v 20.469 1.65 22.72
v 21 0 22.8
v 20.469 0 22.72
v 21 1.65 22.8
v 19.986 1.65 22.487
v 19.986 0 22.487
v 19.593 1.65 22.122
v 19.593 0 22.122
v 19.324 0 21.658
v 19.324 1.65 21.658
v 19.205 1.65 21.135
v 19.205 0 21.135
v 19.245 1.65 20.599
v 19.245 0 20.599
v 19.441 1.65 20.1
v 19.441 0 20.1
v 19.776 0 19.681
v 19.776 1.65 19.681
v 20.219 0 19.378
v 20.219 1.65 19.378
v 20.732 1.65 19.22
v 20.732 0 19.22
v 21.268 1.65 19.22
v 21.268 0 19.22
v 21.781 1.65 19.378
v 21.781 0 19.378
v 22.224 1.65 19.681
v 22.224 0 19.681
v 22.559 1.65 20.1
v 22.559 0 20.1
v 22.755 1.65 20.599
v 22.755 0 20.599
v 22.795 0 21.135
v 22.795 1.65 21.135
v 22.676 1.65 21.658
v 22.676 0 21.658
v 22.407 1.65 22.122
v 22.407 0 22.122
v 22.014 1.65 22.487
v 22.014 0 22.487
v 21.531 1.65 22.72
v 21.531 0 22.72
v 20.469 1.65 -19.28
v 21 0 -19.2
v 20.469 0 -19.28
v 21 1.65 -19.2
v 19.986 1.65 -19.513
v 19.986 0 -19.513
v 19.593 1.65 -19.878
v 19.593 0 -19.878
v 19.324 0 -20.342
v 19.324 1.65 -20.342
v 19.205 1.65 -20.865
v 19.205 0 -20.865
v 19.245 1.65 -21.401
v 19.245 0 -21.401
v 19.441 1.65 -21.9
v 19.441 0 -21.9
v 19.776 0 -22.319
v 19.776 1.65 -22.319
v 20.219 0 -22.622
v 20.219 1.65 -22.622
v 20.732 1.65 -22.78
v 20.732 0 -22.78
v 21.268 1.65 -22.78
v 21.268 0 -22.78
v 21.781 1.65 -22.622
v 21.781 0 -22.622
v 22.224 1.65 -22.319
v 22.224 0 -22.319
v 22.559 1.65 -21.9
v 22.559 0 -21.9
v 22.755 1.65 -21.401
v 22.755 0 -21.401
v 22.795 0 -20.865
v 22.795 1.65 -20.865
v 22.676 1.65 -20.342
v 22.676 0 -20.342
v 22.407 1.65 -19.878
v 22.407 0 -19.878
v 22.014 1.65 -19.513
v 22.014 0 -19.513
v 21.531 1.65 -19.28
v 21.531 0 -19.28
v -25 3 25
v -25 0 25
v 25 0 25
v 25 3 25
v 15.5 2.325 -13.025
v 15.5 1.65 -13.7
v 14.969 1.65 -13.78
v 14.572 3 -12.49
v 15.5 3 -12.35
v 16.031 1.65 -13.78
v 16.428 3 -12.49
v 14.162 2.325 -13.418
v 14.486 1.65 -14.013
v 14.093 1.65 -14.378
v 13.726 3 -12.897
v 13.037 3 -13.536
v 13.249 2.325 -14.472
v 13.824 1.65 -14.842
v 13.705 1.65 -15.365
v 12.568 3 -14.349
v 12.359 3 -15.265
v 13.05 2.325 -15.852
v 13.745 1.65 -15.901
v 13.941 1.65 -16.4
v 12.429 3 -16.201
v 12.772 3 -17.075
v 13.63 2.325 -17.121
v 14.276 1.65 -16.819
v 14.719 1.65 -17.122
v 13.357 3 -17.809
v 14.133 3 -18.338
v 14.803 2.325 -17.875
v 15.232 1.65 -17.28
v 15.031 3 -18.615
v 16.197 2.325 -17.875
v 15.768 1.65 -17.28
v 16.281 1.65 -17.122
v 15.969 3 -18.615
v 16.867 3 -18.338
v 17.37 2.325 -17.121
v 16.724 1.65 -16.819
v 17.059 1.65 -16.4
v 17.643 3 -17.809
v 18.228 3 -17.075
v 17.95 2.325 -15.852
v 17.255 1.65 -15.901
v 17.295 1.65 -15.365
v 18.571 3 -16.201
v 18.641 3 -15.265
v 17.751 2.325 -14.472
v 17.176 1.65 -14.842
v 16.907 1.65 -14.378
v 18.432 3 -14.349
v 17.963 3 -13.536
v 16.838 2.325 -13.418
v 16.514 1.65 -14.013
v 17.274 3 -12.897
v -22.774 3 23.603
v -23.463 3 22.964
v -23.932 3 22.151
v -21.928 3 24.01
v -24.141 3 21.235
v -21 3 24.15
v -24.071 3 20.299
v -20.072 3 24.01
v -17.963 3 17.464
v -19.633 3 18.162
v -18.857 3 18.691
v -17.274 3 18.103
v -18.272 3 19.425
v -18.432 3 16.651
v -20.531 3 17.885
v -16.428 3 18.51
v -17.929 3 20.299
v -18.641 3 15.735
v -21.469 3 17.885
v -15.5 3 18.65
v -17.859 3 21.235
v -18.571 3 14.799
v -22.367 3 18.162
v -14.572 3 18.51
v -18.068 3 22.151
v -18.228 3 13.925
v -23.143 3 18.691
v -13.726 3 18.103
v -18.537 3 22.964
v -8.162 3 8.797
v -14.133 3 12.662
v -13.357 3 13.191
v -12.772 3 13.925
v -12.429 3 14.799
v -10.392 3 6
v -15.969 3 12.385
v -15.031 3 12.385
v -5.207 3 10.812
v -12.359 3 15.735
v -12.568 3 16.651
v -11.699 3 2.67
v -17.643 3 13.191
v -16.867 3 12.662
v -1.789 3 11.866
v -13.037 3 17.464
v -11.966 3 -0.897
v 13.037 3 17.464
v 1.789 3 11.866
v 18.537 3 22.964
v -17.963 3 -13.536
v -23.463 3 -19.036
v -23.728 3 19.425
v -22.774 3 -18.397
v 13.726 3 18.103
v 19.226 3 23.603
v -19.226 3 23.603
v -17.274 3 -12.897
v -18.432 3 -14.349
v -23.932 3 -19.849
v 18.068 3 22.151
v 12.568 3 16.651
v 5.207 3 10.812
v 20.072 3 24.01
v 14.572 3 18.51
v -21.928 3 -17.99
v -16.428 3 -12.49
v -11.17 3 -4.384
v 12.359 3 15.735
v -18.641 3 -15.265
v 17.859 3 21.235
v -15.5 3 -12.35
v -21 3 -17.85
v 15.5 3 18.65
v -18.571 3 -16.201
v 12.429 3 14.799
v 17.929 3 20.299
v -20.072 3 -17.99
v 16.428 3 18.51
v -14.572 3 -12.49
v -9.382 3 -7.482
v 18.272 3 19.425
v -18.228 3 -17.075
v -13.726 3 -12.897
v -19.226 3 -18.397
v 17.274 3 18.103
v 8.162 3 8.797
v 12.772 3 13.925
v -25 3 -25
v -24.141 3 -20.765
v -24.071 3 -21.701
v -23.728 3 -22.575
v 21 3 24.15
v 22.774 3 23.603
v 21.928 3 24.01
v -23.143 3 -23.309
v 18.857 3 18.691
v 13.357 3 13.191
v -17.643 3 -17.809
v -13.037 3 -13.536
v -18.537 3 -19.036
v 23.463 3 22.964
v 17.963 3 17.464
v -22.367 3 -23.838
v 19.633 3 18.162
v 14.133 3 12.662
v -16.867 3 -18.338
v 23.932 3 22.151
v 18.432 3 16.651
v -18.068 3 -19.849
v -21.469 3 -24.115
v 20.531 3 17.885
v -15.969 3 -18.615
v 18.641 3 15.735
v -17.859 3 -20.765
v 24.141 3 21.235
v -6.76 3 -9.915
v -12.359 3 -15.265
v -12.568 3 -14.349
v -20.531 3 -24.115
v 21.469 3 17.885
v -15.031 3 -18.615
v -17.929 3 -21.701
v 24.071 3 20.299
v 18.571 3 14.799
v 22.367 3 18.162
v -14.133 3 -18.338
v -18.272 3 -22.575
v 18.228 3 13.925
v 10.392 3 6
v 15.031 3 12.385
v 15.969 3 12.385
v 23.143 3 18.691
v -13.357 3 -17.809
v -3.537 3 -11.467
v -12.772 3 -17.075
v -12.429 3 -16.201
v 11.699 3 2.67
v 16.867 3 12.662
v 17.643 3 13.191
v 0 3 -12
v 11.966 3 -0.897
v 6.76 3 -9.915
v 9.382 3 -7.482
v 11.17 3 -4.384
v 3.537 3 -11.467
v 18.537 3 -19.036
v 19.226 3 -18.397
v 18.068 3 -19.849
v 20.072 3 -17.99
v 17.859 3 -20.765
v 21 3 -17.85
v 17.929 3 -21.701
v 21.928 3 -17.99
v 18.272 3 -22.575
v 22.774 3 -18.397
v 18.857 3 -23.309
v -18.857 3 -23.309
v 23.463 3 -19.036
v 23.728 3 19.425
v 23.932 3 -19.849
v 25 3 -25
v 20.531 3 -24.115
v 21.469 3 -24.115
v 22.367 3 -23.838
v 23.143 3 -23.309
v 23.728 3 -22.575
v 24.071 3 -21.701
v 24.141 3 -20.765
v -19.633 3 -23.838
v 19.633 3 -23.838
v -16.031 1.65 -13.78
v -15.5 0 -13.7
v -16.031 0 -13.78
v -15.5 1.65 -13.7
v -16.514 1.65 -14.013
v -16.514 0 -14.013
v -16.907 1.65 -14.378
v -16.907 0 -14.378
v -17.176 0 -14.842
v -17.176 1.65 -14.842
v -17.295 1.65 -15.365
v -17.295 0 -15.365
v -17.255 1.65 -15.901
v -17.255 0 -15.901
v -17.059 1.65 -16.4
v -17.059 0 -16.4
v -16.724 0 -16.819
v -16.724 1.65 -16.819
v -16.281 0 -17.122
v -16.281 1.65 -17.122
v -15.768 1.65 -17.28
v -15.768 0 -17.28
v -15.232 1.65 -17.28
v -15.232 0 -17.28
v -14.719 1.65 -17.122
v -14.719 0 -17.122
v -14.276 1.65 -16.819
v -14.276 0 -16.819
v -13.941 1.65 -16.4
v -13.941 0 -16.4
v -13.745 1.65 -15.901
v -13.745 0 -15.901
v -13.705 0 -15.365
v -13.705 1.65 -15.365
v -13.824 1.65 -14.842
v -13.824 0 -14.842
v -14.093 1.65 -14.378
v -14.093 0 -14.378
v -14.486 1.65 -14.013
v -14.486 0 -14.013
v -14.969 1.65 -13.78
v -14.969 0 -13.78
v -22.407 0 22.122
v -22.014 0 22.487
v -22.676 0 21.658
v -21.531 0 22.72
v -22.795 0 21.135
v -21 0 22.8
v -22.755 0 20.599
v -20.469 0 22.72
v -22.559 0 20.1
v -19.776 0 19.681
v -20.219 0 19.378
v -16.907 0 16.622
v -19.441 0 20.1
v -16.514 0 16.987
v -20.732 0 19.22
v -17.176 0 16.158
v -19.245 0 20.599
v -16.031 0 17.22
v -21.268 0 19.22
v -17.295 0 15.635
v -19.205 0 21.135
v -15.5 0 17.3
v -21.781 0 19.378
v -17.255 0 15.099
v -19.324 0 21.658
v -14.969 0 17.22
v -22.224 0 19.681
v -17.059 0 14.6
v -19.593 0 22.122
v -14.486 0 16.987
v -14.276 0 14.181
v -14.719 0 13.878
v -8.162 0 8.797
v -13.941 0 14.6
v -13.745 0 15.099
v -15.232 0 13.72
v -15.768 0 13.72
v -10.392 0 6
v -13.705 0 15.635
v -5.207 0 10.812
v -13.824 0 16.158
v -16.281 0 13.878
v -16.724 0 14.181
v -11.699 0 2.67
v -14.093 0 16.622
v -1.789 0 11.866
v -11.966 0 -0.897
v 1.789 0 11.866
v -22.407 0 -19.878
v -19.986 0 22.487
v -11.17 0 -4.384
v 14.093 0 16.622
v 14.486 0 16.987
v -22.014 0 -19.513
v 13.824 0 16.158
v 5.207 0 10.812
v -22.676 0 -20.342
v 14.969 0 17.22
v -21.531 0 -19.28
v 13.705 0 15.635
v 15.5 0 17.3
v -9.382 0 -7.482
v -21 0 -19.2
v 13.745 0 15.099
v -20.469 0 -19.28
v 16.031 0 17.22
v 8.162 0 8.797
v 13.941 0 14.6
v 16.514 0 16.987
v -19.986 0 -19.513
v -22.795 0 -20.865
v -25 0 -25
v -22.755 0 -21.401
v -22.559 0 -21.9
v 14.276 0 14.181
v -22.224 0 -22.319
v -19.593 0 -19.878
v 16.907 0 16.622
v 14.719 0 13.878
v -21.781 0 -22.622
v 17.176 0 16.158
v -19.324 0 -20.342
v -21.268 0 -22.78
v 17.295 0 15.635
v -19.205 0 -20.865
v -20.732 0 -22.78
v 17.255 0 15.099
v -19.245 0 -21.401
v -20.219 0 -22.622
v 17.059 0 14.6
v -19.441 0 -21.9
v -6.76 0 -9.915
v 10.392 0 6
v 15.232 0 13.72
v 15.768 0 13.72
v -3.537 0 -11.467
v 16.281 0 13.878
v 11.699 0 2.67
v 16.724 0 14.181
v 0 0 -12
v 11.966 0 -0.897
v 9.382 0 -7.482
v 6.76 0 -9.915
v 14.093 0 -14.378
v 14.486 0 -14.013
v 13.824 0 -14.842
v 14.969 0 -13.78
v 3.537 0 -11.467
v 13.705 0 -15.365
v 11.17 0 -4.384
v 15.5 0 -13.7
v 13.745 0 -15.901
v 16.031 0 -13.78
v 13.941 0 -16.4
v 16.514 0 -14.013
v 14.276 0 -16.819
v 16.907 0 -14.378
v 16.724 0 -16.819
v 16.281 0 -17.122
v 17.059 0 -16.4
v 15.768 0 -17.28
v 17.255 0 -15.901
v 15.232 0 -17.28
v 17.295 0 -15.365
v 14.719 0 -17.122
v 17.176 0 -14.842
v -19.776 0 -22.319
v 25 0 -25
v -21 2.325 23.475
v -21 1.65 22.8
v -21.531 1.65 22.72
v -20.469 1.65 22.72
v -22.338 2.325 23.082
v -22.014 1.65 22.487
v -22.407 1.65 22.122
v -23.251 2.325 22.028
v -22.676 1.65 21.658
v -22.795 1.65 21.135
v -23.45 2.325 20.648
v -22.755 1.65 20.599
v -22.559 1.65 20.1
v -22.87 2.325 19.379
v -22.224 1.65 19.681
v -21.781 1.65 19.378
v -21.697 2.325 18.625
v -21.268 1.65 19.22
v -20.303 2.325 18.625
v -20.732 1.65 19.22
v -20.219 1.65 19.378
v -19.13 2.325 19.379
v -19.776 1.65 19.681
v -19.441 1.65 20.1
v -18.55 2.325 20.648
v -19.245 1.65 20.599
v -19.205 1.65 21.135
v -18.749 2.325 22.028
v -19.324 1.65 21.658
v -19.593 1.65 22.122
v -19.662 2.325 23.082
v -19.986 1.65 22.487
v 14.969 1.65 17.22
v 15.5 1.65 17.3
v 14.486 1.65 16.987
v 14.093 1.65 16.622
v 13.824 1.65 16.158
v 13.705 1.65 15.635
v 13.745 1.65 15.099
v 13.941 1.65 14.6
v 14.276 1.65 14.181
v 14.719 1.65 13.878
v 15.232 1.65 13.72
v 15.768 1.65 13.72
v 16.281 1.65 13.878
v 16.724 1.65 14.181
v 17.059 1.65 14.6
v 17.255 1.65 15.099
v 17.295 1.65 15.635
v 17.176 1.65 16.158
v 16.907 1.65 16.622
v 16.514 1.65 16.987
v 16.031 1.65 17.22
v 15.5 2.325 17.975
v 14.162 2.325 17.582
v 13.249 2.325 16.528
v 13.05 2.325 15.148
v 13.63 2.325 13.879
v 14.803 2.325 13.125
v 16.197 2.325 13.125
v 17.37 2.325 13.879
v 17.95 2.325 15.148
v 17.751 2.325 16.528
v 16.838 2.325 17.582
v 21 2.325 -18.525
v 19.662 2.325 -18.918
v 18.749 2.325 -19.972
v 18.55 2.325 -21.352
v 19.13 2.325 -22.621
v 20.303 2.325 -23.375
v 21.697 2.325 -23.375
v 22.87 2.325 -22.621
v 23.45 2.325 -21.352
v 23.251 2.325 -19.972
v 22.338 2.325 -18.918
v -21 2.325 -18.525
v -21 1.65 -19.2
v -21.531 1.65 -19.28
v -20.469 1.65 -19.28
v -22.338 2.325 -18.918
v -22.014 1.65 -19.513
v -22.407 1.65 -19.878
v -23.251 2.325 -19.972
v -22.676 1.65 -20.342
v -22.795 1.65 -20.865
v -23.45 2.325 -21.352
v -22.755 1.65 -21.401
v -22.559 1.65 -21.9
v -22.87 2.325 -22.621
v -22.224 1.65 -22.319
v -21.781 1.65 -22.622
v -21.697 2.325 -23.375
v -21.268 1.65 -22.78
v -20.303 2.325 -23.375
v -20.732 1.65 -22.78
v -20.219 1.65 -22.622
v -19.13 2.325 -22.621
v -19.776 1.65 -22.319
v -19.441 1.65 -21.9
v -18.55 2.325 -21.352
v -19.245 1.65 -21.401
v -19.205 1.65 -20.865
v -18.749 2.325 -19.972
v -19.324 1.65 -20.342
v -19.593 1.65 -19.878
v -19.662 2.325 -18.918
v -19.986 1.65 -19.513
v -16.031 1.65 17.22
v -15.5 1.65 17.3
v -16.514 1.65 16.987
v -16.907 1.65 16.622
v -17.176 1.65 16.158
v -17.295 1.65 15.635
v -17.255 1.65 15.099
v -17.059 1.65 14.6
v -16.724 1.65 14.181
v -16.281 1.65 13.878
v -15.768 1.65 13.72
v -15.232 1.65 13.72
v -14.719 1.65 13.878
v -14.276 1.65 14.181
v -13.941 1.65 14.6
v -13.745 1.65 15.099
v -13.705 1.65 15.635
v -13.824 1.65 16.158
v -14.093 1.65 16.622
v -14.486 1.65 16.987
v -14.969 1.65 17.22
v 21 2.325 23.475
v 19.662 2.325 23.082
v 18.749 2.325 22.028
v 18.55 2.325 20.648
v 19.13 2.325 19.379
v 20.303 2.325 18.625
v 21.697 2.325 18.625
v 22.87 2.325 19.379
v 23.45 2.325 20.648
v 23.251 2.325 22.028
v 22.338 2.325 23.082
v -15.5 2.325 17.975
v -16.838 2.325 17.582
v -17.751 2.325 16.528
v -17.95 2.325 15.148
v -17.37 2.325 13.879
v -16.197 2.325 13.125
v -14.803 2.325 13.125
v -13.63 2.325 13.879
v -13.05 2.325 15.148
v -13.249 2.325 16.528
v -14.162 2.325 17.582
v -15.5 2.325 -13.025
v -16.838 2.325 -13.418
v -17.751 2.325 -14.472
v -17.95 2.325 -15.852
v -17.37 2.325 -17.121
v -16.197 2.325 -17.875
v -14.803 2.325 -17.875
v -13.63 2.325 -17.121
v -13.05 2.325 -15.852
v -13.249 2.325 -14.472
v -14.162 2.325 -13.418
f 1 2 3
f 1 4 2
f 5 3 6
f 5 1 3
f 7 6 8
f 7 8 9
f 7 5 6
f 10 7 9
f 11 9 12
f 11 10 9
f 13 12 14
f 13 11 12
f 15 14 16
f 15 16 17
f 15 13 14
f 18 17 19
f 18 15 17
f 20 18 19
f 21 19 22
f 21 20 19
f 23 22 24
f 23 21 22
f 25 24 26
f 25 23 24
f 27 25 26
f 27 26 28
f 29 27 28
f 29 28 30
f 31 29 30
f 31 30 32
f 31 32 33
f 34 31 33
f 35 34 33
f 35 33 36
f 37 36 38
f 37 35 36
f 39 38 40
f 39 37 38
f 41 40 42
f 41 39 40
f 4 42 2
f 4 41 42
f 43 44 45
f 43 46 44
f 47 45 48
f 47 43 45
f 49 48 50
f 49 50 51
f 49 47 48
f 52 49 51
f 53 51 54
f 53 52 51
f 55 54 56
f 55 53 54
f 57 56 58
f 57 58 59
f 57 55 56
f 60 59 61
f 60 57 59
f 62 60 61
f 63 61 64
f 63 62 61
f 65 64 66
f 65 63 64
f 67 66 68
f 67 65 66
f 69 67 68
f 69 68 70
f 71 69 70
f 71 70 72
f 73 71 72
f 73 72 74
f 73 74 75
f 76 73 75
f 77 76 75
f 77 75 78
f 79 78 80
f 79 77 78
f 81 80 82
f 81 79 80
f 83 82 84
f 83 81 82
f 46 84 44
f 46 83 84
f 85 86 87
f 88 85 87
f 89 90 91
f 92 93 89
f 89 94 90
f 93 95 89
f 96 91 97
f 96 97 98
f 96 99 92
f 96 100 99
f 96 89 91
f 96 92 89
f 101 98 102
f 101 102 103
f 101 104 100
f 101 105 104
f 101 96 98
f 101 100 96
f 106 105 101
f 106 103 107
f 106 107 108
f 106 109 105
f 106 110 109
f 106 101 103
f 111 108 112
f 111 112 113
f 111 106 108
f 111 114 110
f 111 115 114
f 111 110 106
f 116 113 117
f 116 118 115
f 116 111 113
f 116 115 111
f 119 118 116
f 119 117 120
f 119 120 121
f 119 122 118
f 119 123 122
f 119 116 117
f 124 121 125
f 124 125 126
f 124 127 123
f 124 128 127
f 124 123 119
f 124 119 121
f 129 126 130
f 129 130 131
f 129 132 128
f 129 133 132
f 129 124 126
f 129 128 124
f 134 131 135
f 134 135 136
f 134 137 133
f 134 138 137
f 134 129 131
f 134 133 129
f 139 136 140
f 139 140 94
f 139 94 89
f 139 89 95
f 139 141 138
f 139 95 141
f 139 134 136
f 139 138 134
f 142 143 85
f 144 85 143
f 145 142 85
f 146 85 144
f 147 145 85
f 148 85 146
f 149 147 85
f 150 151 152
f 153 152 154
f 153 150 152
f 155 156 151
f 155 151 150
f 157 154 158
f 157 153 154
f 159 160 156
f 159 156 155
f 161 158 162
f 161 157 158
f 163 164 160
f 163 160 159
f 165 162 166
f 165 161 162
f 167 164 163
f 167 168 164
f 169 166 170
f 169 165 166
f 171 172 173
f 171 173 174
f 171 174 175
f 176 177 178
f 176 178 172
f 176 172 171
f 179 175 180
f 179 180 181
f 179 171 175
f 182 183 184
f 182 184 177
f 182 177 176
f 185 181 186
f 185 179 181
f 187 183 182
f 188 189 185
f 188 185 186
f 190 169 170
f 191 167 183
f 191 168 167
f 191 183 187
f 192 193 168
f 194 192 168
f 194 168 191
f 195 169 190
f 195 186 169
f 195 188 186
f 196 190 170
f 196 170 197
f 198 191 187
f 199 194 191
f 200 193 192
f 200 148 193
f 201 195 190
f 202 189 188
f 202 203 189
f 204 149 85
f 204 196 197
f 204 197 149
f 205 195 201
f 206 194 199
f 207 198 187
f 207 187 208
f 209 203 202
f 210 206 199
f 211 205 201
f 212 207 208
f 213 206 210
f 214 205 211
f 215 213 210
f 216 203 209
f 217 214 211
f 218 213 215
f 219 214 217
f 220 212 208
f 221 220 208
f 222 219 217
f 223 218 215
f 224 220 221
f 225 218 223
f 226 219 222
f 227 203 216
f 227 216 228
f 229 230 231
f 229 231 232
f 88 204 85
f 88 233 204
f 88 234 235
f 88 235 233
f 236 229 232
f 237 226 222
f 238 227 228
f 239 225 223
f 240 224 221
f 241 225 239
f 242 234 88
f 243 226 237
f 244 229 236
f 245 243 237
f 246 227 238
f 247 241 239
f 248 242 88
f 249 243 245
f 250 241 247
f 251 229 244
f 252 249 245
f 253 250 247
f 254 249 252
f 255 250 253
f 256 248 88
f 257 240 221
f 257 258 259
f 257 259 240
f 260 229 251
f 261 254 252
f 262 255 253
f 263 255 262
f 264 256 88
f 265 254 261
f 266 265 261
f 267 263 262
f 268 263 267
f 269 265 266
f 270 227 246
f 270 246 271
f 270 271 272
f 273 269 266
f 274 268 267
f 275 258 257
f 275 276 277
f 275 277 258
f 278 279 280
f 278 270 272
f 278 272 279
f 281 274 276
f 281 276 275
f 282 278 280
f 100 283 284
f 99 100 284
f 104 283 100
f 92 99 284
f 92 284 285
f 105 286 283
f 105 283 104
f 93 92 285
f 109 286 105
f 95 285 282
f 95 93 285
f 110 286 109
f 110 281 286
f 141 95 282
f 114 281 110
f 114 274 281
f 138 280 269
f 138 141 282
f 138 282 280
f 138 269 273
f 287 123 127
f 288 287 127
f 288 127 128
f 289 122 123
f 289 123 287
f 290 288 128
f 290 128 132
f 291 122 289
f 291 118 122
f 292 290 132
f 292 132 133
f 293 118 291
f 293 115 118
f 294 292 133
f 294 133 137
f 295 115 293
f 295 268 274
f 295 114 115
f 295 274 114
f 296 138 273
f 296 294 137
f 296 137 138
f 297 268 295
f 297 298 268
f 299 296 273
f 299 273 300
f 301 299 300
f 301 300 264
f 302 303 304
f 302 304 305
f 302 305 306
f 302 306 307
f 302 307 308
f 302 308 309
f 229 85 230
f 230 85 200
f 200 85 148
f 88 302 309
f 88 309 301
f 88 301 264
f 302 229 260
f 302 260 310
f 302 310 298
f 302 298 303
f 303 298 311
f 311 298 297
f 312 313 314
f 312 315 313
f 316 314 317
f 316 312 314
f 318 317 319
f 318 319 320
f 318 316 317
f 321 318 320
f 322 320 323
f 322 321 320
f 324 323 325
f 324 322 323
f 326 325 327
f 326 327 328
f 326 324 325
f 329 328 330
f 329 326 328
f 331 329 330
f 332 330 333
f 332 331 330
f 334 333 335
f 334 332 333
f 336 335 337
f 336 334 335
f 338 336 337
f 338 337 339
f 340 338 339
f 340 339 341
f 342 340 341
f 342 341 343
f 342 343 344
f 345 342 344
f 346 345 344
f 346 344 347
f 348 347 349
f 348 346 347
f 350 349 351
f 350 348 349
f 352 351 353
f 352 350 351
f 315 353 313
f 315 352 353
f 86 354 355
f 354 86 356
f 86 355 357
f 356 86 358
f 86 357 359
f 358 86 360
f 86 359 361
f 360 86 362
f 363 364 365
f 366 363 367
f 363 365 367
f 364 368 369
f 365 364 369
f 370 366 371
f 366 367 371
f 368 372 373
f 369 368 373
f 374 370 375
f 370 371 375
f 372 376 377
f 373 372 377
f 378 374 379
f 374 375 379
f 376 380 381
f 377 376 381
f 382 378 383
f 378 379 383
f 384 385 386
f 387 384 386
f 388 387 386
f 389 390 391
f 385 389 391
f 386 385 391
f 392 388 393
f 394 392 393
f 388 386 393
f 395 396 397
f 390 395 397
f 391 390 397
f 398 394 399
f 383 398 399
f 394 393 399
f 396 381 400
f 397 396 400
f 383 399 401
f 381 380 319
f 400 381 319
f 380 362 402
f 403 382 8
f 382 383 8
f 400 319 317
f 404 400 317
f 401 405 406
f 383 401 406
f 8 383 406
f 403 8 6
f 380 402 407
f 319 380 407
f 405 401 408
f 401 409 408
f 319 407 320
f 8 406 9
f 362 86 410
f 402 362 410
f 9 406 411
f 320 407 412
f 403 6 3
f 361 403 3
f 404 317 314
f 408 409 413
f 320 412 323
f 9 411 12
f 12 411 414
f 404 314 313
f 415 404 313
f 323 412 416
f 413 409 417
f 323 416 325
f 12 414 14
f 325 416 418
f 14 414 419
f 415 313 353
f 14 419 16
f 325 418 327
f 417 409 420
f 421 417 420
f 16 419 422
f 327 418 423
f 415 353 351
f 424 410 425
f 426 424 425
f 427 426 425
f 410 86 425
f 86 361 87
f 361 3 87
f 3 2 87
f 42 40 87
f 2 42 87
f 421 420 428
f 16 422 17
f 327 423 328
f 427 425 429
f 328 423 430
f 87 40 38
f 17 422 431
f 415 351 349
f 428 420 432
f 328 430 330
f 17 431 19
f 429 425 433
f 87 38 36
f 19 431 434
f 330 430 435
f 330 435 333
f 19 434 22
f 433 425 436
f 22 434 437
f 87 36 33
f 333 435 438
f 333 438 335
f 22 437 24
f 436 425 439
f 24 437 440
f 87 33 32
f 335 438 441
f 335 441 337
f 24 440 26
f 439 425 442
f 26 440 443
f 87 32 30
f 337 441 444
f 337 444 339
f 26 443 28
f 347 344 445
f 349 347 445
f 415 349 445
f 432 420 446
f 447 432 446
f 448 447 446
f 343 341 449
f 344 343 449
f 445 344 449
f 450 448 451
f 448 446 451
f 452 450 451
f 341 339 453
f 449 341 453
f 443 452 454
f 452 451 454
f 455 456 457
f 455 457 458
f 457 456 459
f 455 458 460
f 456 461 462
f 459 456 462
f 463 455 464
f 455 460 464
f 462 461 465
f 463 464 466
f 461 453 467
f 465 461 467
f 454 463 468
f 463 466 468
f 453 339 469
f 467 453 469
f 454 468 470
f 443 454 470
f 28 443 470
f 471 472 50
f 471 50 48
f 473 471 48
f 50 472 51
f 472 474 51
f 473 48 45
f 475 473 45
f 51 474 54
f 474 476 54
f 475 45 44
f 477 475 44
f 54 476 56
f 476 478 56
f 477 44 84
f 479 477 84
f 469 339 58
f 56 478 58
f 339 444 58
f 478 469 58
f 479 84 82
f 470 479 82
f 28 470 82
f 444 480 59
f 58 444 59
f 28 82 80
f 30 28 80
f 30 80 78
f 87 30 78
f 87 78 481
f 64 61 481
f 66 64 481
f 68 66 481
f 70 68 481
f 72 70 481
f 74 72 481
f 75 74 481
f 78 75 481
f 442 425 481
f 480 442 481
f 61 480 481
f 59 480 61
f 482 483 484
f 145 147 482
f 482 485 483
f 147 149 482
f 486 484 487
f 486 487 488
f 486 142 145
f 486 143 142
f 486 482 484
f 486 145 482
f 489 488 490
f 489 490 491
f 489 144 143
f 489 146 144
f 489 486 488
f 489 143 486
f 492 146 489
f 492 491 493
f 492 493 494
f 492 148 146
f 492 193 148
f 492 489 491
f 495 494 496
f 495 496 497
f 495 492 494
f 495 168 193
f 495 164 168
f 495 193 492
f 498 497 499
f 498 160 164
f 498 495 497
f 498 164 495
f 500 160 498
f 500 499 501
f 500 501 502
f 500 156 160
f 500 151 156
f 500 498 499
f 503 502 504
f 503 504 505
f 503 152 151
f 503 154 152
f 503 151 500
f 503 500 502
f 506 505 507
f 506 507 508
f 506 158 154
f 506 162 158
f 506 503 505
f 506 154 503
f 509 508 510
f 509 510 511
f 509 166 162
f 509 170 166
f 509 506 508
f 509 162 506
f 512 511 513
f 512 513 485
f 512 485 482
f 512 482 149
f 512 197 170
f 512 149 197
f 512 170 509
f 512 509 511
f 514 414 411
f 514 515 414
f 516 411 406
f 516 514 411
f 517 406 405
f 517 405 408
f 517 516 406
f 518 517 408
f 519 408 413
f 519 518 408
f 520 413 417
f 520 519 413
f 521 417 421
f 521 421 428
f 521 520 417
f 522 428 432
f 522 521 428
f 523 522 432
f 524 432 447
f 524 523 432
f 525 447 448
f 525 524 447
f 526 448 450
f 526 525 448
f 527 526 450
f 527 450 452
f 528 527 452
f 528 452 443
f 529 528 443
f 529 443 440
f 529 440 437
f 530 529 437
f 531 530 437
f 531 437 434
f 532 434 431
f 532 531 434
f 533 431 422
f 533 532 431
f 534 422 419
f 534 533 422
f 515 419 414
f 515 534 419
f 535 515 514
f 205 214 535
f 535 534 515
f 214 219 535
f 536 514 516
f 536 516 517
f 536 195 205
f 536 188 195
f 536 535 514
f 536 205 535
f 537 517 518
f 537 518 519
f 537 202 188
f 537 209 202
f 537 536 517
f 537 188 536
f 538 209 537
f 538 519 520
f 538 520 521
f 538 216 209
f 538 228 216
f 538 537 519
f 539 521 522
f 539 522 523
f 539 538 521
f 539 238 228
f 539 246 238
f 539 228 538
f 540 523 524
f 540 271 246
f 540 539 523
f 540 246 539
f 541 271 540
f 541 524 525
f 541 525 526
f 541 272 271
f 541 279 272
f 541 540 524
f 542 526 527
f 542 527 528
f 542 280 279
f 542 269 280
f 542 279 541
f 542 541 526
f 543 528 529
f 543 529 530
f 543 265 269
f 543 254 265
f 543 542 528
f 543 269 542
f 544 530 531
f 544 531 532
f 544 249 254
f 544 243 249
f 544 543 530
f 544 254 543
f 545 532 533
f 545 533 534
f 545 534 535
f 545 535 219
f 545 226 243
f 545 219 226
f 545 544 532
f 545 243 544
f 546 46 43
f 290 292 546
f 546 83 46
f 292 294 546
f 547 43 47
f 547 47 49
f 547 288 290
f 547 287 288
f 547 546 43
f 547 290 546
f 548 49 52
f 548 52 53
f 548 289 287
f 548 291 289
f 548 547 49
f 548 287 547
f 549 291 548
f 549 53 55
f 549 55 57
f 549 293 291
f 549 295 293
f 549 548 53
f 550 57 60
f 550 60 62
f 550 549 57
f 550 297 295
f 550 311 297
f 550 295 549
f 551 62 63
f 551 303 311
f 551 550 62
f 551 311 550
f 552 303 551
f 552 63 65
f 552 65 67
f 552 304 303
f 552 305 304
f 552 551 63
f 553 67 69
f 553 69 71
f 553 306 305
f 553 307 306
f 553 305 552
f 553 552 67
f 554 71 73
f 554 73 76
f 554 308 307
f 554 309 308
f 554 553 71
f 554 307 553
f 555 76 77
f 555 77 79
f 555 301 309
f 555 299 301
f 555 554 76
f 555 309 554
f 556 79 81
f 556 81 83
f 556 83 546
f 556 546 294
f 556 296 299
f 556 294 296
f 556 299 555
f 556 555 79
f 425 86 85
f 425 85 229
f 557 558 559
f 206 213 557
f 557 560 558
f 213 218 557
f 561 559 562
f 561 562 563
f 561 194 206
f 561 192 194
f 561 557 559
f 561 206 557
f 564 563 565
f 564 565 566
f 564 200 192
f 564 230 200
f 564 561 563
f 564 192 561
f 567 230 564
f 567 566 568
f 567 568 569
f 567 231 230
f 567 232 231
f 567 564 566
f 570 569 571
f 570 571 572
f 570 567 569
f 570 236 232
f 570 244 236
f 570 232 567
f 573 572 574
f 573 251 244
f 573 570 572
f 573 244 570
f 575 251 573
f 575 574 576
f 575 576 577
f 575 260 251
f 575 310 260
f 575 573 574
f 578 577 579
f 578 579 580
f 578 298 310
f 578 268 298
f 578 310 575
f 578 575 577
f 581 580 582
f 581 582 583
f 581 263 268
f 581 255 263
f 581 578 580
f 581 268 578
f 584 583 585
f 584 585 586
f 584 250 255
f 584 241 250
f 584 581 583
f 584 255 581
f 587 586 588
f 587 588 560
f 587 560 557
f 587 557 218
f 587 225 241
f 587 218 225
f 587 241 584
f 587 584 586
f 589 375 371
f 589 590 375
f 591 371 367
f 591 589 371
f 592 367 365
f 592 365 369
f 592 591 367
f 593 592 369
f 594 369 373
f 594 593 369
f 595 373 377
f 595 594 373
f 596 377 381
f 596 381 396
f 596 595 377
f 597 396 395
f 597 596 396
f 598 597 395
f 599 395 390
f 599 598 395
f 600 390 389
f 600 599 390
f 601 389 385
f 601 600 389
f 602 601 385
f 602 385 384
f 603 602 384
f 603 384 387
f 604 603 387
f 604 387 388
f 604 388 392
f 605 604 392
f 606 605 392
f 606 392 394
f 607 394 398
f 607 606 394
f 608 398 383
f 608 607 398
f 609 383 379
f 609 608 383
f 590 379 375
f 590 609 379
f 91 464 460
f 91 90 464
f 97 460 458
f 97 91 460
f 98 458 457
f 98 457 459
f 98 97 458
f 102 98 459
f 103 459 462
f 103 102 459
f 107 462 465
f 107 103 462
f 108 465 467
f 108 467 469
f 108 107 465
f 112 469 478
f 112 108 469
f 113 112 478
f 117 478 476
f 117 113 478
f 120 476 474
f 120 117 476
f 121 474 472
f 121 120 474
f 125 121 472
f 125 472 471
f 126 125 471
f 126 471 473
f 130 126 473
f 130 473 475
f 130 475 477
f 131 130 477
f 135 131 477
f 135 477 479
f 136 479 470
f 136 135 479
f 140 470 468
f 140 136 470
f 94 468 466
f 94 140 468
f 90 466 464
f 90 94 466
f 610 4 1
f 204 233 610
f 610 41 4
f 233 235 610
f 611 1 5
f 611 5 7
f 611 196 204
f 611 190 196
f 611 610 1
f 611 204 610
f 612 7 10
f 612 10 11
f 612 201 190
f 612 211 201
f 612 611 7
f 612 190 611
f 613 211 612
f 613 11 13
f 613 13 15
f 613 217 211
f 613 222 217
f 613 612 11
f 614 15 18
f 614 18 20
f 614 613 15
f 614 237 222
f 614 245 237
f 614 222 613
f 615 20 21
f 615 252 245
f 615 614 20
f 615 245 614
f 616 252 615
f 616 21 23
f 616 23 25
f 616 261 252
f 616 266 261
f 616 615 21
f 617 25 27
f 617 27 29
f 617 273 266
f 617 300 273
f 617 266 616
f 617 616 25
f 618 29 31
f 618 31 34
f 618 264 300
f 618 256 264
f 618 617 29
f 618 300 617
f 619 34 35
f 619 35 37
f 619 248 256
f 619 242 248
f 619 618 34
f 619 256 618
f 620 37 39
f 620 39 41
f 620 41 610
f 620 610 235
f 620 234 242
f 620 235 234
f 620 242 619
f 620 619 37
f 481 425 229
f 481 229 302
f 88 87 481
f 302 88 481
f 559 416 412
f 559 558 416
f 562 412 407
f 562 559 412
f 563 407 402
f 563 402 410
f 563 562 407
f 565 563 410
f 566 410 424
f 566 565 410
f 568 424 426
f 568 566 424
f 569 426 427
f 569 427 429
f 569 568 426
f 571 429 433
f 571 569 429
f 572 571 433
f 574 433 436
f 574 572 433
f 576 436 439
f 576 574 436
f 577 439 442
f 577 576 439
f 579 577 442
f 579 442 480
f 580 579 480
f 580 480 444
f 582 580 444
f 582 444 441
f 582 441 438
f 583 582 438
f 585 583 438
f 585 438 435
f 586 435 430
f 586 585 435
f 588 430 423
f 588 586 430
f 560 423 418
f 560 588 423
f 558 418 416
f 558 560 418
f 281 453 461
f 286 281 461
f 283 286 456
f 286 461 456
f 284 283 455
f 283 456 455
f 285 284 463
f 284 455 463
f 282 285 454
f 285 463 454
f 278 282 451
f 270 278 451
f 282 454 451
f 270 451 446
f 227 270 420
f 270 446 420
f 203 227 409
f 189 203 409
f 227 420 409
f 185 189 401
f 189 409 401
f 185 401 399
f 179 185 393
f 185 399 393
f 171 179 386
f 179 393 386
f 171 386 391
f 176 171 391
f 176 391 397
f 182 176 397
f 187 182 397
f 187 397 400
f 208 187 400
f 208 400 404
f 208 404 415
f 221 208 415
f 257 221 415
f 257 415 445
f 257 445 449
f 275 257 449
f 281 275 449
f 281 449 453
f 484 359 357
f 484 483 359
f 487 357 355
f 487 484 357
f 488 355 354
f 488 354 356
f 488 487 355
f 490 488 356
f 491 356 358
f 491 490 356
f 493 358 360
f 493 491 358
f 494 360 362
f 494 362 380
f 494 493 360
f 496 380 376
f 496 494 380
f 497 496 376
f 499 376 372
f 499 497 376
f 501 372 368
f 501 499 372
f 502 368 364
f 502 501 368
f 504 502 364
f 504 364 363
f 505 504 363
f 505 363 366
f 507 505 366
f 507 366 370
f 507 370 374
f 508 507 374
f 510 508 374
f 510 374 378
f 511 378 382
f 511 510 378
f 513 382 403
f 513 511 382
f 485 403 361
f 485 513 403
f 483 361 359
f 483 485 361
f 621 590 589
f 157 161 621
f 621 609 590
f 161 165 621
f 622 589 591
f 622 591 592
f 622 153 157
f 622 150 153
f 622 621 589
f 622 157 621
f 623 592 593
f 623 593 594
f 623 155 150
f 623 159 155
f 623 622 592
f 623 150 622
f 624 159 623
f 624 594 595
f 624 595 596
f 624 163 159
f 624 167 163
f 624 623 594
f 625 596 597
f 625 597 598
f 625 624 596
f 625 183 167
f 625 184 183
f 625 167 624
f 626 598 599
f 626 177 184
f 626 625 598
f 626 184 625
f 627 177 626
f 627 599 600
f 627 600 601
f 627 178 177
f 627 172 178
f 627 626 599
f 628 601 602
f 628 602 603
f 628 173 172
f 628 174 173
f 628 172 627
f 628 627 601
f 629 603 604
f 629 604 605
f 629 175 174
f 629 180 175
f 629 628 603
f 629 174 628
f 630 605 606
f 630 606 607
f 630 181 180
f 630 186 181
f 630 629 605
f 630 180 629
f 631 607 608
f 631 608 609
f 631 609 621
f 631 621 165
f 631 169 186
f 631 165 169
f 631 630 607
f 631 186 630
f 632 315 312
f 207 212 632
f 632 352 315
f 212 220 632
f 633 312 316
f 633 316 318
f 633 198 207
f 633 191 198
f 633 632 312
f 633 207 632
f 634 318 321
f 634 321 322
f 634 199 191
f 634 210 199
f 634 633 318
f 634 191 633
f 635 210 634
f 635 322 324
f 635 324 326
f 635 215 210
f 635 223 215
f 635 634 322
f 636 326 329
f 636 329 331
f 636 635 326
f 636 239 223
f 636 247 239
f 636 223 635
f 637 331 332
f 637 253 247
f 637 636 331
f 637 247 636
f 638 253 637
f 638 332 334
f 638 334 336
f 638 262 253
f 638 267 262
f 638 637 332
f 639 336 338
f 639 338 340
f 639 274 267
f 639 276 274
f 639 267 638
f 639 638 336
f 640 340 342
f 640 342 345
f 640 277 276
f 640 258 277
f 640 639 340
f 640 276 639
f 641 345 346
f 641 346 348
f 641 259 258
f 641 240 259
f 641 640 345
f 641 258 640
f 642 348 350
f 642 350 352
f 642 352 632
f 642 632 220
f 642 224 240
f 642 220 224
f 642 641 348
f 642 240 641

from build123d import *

# Parameters (mm, degrees)
PLATE_W                                        = 50
PLATE_H                                        = 50
BOSS_EXTRUDE1_DEPTH                            = 3
CSK_FOR_M3_OVAL_HEAD_MACHINE_SCREW1_AT_2_COUNT = 2
CSK_FOR_M3_OVAL_HEAD_MACHINE_SCREW1_AT_2_PITCH = 42
CSK_FOR_M3_OVAL_HEAD_MACHINE_SCREW1_AT_3_COUNT = 2
CSK_FOR_M3_OVAL_HEAD_MACHINE_SCREW1_AT_3_PITCH = 59.39696962
CSK_FOR_M3_OVAL_HEAD_MACHINE_SCREW1_AT_4_COUNT = 2
CSK_FOR_M3_OVAL_HEAD_MACHINE_SCREW1_AT_4_PITCH = 42
F_24_0_24_DIAMETER_HOLE1_D                     = 24
F_24_0_24_DIAMETER_HOLE1_ON_FACE_2_D           = 24
F_24_0_24_DIAMETER_HOLE1_ON_FACE_3_D           = 24
CSK_FOR_M3_OVAL_HEAD_MACHINE_SCREW2_AT_2_COUNT = 2
CSK_FOR_M3_OVAL_HEAD_MACHINE_SCREW2_AT_2_PITCH = 31
CSK_FOR_M3_OVAL_HEAD_MACHINE_SCREW2_AT_3_COUNT = 2
CSK_FOR_M3_OVAL_HEAD_MACHINE_SCREW2_AT_3_PITCH = 43.840620434
CSK_FOR_M3_OVAL_HEAD_MACHINE_SCREW2_AT_4_COUNT = 2
CSK_FOR_M3_OVAL_HEAD_MACHINE_SCREW2_AT_4_PITCH = 31


with BuildPart() as part:
    # Plate → Boss-Extrude1 (new body)
    with BuildSketch(Plane(origin=(0, 0, 0), x_dir=(1, 0, 0), z_dir=(0, 1, 0))):
        Rectangle(PLATE_W, PLATE_H)
    extrude(amount=BOSS_EXTRUDE1_DEPTH)

    # Sketch3 → CSK for M3 Oval Head Machine Screw1 (revolve, cut)
    with BuildSketch(Plane(origin=(-21, 3, 21), x_dir=(0, 0, 1), z_dir=(1, 0, 0))):
        Polygon((0, 0), (0, 3), (1.8, 3), (1.8, 1.35), (3.15, 0), align=None)
    csk_for_m3_oval_head_machine_screw1 = revolve(axis=Axis((-21, 9.35, 21), (0, -1, 0)), mode=Mode.SUBTRACT)

    # CSK for M3 Oval Head Machine Screw1 at 2: CSK for M3 Oval Head Machine Screw1 ×2
    with Locations(*[(0, 0, -i * CSK_FOR_M3_OVAL_HEAD_MACHINE_SCREW1_AT_2_PITCH) for i in range(1, CSK_FOR_M3_OVAL_HEAD_MACHINE_SCREW1_AT_2_COUNT)]):
        add(csk_for_m3_oval_head_machine_screw1, mode=Mode.SUBTRACT)

    # CSK for M3 Oval Head Machine Screw1 at 3: CSK for M3 Oval Head Machine Screw1 ×2
    with Locations(*[Vector(0.707106781, 0, -0.707106781) * (i * CSK_FOR_M3_OVAL_HEAD_MACHINE_SCREW1_AT_3_PITCH) for i in range(1, CSK_FOR_M3_OVAL_HEAD_MACHINE_SCREW1_AT_3_COUNT)]):
        add(csk_for_m3_oval_head_machine_screw1, mode=Mode.SUBTRACT)

    # CSK for M3 Oval Head Machine Screw1 at 4: CSK for M3 Oval Head Machine Screw1 ×2
    with Locations(*[(i * CSK_FOR_M3_OVAL_HEAD_MACHINE_SCREW1_AT_4_PITCH, 0, 0) for i in range(1, CSK_FOR_M3_OVAL_HEAD_MACHINE_SCREW1_AT_4_COUNT)]):
        add(csk_for_m3_oval_head_machine_screw1, mode=Mode.SUBTRACT)

    # Ø24.0 (24) Diameter Hole1 (through all)
    with Locations(Plane.ZX.offset(3)):
        with Locations((0, 0)):
            Hole(F_24_0_24_DIAMETER_HOLE1_D / 2)

    # Ø24.0 (24) Diameter Hole1 on face 2 (through all)
    with Locations(Plane(origin=(0, 0, 0), x_dir=(0, 0, -1), z_dir=(0, -1, 0))):
        with Locations((0, 0)):
            Hole(F_24_0_24_DIAMETER_HOLE1_ON_FACE_2_D / 2)

    # Ø24.0 (24) Diameter Hole1 on face 3 (through all)
    with Locations(Plane(origin=(-62.061079299, -166.048748064, 0), x_dir=(0, 0, 1), z_dir=(0, 1, 0))):
        with Locations((0, 0)):
            Hole(F_24_0_24_DIAMETER_HOLE1_ON_FACE_3_D / 2)

    # Sketch6 → CSK for M3 Oval Head Machine Screw2 (revolve, cut)
    with BuildSketch(Plane(origin=(-15.5, 3, -15.5), x_dir=(0, 0, 1), z_dir=(1, 0, 0))):
        Polygon((0, 0), (0, 3), (1.8, 3), (1.8, 1.35), (3.15, 0), align=None)
    csk_for_m3_oval_head_machine_screw2 = revolve(axis=Axis((-15.5, 9.35, -15.5), (0, -1, 0)), mode=Mode.SUBTRACT)

    # CSK for M3 Oval Head Machine Screw2 at 2: CSK for M3 Oval Head Machine Screw2 ×2
    with Locations(*[(i * CSK_FOR_M3_OVAL_HEAD_MACHINE_SCREW2_AT_2_PITCH, 0, 0) for i in range(1, CSK_FOR_M3_OVAL_HEAD_MACHINE_SCREW2_AT_2_COUNT)]):
        add(csk_for_m3_oval_head_machine_screw2, mode=Mode.SUBTRACT)

    # CSK for M3 Oval Head Machine Screw2 at 3: CSK for M3 Oval Head Machine Screw2 ×2
    with Locations(*[Vector(0.707106781, 0, 0.707106781) * (i * CSK_FOR_M3_OVAL_HEAD_MACHINE_SCREW2_AT_3_PITCH) for i in range(1, CSK_FOR_M3_OVAL_HEAD_MACHINE_SCREW2_AT_3_COUNT)]):
        add(csk_for_m3_oval_head_machine_screw2, mode=Mode.SUBTRACT)

    # CSK for M3 Oval Head Machine Screw2 at 4: CSK for M3 Oval Head Machine Screw2 ×2
    with Locations(*[(0, 0, i * CSK_FOR_M3_OVAL_HEAD_MACHINE_SCREW2_AT_4_PITCH) for i in range(1, CSK_FOR_M3_OVAL_HEAD_MACHINE_SCREW2_AT_4_COUNT)]):
        add(csk_for_m3_oval_head_machine_screw2, mode=Mode.SUBTRACT)


solid = part.part
